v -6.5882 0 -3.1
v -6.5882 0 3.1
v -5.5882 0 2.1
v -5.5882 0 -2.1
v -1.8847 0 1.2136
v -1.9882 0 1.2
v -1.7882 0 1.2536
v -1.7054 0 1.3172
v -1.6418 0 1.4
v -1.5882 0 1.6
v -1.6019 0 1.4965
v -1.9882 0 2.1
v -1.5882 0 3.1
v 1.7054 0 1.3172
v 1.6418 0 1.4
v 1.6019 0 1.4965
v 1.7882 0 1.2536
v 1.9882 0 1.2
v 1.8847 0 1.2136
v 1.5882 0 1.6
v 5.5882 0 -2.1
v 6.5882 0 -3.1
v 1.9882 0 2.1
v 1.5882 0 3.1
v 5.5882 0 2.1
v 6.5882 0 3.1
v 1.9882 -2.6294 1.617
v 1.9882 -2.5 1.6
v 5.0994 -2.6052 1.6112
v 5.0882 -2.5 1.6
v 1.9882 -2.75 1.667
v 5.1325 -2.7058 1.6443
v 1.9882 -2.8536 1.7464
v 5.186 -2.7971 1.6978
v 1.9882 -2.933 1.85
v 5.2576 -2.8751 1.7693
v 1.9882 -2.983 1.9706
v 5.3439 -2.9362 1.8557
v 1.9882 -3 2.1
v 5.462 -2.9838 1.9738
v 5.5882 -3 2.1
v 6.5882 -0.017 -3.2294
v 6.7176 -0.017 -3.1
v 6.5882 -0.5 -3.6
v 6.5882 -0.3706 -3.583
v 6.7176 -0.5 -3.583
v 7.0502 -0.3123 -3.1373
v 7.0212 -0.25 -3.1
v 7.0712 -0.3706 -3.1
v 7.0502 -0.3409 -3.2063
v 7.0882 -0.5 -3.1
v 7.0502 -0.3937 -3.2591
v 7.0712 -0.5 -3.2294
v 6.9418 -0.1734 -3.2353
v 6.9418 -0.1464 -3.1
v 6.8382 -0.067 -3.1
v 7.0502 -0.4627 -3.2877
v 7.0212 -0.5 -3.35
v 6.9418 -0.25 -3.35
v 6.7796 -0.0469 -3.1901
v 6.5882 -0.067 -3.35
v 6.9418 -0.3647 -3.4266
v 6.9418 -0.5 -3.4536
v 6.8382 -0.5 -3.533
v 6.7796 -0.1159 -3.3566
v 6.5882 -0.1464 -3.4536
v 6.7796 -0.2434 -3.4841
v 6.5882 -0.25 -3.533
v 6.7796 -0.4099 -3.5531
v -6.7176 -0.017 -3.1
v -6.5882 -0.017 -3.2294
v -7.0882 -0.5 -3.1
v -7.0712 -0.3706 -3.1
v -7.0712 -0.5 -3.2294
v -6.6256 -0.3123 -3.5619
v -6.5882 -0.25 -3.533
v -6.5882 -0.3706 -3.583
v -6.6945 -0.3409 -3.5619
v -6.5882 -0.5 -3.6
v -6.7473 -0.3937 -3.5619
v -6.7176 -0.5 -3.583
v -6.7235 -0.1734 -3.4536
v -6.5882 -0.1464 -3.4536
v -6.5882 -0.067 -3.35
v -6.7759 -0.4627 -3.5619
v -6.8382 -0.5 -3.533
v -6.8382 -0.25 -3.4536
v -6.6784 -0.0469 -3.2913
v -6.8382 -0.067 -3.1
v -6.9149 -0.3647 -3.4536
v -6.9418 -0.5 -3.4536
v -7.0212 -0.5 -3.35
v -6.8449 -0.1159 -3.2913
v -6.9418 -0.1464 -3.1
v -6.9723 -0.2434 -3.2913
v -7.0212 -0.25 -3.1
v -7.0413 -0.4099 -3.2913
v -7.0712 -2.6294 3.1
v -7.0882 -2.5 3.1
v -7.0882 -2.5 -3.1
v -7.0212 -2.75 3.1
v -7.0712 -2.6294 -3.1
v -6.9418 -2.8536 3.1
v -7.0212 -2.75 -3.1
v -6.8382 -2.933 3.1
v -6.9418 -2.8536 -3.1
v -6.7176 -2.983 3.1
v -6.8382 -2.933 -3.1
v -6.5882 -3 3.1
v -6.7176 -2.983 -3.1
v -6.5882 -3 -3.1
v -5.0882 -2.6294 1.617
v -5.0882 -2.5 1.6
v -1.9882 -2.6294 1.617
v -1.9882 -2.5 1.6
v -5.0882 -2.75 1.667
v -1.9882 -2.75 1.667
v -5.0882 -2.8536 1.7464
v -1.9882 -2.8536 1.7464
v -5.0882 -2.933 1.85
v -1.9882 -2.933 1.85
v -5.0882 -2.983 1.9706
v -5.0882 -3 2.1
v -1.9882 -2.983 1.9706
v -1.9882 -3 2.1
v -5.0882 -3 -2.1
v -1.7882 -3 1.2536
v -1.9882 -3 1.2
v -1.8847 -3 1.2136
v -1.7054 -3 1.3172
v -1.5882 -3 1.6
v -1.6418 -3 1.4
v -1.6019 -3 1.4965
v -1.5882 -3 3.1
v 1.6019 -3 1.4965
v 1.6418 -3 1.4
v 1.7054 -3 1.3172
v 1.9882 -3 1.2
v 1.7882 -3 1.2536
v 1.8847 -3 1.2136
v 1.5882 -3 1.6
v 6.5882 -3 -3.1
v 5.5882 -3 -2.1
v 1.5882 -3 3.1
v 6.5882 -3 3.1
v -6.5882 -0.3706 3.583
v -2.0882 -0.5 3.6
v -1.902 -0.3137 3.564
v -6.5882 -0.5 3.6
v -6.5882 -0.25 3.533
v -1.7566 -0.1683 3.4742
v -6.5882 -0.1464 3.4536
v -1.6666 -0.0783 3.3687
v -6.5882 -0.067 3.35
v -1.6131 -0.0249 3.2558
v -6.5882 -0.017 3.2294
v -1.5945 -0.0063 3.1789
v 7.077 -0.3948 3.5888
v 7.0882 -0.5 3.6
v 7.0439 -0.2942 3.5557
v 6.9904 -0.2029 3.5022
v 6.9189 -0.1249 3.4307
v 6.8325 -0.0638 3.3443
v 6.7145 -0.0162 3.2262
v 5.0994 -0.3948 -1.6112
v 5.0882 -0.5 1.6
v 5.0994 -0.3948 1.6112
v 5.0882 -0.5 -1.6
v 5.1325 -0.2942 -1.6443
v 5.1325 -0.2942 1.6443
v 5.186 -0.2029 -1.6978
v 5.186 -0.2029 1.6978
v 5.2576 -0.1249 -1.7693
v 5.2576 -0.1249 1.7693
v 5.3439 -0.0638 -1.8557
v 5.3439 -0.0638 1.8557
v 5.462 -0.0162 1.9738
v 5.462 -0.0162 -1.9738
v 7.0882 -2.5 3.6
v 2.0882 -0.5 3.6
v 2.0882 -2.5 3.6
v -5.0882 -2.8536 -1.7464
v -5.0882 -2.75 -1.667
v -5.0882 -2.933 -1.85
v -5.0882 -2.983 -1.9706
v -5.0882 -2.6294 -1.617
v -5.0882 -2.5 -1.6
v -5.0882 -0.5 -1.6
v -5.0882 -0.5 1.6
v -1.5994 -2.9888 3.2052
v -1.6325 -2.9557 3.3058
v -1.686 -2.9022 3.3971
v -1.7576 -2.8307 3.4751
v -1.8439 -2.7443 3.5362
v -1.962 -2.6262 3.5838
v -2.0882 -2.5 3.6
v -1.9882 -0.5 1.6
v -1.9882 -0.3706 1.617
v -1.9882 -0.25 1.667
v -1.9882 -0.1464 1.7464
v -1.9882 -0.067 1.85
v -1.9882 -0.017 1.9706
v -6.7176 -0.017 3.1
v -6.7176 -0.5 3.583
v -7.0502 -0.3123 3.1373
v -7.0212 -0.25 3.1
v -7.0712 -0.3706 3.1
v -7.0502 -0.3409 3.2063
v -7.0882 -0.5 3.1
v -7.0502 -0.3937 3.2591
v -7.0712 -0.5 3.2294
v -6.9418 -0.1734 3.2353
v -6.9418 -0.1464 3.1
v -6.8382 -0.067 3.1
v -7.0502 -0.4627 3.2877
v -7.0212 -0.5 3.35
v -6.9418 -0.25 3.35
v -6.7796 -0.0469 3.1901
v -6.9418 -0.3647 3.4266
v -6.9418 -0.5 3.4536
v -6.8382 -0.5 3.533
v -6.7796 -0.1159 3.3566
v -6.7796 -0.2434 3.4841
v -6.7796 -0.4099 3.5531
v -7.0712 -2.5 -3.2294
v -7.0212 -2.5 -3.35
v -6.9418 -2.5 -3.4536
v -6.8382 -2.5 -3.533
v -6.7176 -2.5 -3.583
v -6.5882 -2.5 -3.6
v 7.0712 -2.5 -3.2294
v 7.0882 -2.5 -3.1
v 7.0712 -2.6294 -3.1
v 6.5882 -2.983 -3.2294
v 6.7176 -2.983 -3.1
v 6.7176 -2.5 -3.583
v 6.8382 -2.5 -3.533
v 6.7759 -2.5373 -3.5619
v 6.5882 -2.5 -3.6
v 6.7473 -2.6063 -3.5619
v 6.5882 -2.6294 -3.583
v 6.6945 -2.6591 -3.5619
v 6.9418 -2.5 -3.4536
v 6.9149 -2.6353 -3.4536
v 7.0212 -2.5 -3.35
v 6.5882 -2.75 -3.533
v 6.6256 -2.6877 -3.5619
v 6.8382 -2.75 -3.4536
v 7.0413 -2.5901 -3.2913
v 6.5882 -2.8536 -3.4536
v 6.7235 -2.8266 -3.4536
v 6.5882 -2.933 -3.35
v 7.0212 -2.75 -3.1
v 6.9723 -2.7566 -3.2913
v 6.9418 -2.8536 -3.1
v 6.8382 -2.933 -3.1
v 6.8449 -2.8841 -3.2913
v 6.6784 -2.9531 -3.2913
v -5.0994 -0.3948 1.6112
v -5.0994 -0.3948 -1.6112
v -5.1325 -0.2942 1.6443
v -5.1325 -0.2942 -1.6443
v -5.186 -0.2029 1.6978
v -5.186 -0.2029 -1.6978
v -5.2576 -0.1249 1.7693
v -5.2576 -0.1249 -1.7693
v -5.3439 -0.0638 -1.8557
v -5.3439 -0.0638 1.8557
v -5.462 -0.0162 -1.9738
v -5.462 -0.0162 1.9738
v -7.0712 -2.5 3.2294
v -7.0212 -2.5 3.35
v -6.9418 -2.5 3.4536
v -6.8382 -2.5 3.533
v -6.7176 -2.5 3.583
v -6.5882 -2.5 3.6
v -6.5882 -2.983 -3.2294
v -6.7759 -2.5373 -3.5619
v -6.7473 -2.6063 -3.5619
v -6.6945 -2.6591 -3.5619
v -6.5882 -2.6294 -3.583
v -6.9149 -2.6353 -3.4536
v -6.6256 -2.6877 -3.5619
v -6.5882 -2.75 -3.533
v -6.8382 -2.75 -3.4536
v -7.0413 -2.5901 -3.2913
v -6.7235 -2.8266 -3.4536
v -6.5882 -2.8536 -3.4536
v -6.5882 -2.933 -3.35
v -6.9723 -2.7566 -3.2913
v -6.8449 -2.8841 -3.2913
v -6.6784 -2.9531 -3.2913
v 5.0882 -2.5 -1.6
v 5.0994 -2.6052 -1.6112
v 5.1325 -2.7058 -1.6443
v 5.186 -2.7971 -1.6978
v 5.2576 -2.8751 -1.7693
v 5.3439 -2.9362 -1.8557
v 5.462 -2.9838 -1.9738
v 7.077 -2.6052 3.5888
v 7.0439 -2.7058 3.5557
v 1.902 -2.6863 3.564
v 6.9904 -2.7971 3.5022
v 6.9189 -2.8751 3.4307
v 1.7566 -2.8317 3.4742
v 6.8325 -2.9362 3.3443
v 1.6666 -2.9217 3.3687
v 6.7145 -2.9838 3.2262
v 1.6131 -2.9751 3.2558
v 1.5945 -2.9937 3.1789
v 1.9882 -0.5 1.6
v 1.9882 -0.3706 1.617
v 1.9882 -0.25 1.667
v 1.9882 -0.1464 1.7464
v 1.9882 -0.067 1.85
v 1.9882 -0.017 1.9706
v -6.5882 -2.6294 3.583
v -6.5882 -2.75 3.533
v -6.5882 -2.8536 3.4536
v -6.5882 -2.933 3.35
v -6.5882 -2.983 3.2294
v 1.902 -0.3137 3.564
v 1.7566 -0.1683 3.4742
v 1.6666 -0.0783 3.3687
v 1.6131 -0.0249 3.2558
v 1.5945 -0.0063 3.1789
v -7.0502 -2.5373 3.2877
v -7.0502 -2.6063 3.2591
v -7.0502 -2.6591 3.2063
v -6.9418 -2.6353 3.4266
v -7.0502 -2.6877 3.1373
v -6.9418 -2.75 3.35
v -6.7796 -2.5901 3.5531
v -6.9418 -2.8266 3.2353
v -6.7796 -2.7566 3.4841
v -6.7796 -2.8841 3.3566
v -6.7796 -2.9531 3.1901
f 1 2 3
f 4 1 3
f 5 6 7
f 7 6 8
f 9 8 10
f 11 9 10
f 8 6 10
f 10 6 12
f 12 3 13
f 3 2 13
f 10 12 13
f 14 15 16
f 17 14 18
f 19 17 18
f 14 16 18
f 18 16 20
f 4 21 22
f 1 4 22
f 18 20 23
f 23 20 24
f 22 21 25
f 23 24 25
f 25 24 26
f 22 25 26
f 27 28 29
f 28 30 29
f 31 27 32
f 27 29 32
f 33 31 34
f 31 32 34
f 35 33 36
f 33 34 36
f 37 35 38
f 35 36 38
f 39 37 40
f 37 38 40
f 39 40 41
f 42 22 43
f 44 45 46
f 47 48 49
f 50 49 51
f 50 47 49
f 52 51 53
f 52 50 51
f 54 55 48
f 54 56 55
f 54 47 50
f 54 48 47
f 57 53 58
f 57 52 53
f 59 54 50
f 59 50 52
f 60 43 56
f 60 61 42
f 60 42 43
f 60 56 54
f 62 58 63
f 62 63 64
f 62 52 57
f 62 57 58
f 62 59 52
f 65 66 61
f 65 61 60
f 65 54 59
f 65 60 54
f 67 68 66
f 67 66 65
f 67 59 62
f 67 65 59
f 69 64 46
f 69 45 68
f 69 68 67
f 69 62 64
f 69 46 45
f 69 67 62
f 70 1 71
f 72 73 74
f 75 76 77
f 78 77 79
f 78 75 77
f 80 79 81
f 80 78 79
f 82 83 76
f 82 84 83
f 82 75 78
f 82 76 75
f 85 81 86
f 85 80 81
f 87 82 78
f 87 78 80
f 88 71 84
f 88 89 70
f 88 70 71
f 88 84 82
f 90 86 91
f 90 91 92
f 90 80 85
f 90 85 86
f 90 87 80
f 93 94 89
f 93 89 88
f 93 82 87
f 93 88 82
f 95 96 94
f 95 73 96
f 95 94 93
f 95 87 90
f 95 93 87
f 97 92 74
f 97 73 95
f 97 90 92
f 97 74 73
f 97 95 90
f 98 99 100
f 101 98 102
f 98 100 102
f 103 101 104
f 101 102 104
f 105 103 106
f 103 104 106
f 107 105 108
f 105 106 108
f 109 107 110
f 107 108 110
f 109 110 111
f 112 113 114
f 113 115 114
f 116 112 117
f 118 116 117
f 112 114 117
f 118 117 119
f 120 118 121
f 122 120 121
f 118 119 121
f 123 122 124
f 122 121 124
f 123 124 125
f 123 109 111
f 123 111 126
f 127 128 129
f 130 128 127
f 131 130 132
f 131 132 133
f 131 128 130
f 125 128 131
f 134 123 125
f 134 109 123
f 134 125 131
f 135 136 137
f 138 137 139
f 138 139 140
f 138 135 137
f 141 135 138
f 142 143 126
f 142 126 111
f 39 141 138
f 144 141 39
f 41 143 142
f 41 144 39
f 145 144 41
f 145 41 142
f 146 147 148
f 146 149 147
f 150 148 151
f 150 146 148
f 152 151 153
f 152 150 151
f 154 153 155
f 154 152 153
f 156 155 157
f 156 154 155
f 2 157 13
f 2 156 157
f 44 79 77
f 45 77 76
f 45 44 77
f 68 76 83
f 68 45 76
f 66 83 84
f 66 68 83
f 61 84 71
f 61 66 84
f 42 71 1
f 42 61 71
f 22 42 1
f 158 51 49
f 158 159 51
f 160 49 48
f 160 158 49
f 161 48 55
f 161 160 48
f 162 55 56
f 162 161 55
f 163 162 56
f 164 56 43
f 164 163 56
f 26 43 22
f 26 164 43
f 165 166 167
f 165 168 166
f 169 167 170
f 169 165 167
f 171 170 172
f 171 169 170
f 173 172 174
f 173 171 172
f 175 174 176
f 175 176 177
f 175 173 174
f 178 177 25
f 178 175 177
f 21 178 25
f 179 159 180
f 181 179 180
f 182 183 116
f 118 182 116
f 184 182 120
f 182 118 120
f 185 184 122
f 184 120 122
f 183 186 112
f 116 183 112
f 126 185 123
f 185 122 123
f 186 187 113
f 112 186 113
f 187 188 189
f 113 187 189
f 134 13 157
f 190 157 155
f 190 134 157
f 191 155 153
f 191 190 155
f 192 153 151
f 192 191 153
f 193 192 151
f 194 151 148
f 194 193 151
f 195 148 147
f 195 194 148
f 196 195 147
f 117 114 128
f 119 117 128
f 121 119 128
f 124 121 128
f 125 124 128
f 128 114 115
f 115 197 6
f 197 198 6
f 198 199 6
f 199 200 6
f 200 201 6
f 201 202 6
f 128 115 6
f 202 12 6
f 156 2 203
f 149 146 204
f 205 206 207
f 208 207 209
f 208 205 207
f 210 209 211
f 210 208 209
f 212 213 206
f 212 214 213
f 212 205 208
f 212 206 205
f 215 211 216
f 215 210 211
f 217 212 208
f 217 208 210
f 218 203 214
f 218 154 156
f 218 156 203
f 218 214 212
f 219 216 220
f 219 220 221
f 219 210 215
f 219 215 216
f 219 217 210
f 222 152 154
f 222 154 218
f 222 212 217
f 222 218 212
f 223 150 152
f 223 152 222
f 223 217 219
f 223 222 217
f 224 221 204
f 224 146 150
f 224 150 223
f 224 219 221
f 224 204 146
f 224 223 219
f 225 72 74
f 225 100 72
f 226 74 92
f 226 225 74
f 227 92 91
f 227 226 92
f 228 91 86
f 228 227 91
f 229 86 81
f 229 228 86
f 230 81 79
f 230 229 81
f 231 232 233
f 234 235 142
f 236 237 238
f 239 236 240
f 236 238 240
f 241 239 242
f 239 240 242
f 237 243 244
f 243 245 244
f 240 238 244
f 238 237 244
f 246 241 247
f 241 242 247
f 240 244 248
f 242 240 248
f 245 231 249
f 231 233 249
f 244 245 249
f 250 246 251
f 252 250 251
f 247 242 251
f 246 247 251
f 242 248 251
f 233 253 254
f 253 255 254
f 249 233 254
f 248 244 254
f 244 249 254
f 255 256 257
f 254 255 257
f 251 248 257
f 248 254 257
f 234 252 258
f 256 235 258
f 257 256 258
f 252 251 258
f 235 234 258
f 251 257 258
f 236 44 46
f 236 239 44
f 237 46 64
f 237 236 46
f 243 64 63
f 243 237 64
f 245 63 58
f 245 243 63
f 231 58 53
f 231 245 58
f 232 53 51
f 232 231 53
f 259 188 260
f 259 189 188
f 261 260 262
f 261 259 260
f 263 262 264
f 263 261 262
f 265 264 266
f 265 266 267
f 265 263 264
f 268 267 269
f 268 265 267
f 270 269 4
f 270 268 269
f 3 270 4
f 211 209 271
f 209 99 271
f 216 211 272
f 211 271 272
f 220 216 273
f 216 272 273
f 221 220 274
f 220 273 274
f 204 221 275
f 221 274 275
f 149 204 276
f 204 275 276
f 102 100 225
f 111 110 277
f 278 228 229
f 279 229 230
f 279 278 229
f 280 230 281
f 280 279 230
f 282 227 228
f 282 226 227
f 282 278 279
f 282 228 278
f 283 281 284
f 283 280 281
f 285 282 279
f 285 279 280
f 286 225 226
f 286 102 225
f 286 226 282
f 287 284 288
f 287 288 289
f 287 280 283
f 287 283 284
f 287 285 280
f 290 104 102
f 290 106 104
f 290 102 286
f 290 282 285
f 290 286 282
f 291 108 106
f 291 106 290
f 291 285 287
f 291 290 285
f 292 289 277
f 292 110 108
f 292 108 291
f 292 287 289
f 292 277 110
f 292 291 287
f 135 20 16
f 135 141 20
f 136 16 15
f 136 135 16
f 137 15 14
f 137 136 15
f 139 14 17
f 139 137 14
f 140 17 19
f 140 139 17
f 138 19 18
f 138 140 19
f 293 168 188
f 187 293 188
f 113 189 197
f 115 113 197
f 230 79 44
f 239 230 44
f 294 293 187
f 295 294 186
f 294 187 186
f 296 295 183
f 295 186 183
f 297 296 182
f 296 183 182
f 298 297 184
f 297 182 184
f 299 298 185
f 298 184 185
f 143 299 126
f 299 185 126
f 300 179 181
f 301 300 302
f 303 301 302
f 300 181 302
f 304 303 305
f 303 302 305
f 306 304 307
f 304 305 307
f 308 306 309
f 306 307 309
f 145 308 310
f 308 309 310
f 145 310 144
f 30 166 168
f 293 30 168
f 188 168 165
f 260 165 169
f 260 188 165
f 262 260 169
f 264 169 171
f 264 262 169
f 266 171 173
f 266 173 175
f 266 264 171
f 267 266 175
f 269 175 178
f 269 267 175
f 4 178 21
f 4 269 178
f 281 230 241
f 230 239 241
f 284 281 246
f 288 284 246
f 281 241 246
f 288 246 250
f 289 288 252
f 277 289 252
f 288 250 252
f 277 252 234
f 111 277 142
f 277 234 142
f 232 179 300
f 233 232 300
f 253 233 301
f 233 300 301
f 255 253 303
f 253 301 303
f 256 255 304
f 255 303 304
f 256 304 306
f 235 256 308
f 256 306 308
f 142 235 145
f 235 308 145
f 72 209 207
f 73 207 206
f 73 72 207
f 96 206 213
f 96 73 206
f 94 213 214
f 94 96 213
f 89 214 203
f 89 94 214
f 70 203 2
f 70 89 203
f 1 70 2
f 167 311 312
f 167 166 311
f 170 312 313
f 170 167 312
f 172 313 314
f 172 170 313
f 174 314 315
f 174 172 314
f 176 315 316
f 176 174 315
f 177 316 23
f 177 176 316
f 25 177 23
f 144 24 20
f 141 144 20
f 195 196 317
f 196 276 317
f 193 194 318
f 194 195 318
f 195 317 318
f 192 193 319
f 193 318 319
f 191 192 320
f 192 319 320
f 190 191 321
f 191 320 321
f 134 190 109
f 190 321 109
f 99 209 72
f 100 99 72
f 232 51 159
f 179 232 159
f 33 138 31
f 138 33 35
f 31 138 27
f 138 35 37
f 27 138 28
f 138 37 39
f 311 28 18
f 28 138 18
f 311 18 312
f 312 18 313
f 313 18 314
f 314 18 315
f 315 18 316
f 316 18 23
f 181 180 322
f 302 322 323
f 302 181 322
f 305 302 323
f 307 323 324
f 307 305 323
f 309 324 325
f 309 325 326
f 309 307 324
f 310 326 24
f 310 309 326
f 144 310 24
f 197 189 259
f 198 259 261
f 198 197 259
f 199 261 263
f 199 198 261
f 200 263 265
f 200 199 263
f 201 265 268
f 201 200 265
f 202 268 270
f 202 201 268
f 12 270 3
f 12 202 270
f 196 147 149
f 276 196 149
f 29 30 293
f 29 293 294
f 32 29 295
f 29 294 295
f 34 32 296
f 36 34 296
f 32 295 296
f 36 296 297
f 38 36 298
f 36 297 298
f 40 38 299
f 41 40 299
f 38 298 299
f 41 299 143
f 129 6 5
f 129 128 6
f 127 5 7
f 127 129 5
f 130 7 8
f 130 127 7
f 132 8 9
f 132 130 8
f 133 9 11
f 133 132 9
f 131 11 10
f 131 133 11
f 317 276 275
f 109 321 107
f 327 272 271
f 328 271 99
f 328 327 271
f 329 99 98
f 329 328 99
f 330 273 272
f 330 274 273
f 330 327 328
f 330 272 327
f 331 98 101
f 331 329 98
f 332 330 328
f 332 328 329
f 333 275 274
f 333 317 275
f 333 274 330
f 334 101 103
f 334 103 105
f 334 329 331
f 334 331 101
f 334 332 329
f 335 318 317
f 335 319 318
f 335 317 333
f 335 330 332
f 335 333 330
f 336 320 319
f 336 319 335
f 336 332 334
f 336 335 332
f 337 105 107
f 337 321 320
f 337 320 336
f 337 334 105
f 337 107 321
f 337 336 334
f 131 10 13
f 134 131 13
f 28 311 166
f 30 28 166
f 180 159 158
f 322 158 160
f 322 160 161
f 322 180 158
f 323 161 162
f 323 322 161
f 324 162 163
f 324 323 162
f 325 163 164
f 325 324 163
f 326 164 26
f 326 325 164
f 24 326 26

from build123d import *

# Parameters (mm, degrees)
F1_DEPTH = 3
F2_R     = 0.5
F3_R     = 0.39999


# Not quite as in the source:
# - a fillet or chamfer is up to 0.001 mm smaller than in the source, because OpenCascade refuses the exact size


with BuildPart() as f1:
    # F0 (on Front) → F1 (new body)
    with BuildSketch(Plane.XZ):
        Polygon((-7.0882368928, 3.6), (-7.0882368928, -3.6), (7.0882368928, -3.6), (7.0882368928, 3.6), (1.5882368928, 3.6), (1.5882368928, 1.6), (1.5882368928, 1.2), (1.9882368928, 1.2), (1.9882368928, 1.6), (5.0882368928, 1.6), (5.0882368928, -1.6), (-5.0882368928, -1.6), (-5.0882368928, 1.6), (-1.9882368928, 1.6), (-1.9882368928, 1.2), (-1.5882368928, 1.2), (-1.5882368928, 1.6), (-1.5882368928, 3.6), align=None)
    extrude(amount=F1_DEPTH)

    # F2
    f2_edges = [f1.edges().sort_by_distance(p)[0] for p in [
        (4.338237, 0, 3.6),
        (-4.338237, 0, 3.6),
        (-7.088237, 0, 0),
        (0, 0, -3.6),
        (7.088237, 0, 0),
        (1.588237, -1.5, 3.6),
        (-1.588237, -1.5, 3.6),
        (-4.338237, -3, 3.6),
        (-7.088237, -1.5, 3.6),
        (4.338237, -3, 3.6),
        (3.538237, -3, 1.6),
        (-3.538237, -3, 1.6),
        (3.538237, 0, 1.6),
        (-3.538237, 0, 1.6),
        (-7.088237, -3, 0),
        (7.088237, -3, 0),
        (5.088237, -3, 0),
        (-5.088237, 0, 0),
        (-7.088237, -1.5, -3.6),
        (7.088237, -1.5, -3.6),
        (5.088237, 0, 0),
        (0, 0, -1.6),
        (0, -3, -1.6),
        (0, -3, -3.6),
    ]]
    fillet(f2_edges, radius=F2_R)

    # F3 (radius 0.4 in the source; OpenCascade refuses exactly that, so slightly less here)
    f3_edges = [f1.edges().sort_by_distance(p)[0] for p in [
        (1.588237, -1.5, 1.2),
        (-1.588237, -1.5, 1.2),
    ]]
    fillet(f3_edges, radius=F3_R)


solid = f1.part
